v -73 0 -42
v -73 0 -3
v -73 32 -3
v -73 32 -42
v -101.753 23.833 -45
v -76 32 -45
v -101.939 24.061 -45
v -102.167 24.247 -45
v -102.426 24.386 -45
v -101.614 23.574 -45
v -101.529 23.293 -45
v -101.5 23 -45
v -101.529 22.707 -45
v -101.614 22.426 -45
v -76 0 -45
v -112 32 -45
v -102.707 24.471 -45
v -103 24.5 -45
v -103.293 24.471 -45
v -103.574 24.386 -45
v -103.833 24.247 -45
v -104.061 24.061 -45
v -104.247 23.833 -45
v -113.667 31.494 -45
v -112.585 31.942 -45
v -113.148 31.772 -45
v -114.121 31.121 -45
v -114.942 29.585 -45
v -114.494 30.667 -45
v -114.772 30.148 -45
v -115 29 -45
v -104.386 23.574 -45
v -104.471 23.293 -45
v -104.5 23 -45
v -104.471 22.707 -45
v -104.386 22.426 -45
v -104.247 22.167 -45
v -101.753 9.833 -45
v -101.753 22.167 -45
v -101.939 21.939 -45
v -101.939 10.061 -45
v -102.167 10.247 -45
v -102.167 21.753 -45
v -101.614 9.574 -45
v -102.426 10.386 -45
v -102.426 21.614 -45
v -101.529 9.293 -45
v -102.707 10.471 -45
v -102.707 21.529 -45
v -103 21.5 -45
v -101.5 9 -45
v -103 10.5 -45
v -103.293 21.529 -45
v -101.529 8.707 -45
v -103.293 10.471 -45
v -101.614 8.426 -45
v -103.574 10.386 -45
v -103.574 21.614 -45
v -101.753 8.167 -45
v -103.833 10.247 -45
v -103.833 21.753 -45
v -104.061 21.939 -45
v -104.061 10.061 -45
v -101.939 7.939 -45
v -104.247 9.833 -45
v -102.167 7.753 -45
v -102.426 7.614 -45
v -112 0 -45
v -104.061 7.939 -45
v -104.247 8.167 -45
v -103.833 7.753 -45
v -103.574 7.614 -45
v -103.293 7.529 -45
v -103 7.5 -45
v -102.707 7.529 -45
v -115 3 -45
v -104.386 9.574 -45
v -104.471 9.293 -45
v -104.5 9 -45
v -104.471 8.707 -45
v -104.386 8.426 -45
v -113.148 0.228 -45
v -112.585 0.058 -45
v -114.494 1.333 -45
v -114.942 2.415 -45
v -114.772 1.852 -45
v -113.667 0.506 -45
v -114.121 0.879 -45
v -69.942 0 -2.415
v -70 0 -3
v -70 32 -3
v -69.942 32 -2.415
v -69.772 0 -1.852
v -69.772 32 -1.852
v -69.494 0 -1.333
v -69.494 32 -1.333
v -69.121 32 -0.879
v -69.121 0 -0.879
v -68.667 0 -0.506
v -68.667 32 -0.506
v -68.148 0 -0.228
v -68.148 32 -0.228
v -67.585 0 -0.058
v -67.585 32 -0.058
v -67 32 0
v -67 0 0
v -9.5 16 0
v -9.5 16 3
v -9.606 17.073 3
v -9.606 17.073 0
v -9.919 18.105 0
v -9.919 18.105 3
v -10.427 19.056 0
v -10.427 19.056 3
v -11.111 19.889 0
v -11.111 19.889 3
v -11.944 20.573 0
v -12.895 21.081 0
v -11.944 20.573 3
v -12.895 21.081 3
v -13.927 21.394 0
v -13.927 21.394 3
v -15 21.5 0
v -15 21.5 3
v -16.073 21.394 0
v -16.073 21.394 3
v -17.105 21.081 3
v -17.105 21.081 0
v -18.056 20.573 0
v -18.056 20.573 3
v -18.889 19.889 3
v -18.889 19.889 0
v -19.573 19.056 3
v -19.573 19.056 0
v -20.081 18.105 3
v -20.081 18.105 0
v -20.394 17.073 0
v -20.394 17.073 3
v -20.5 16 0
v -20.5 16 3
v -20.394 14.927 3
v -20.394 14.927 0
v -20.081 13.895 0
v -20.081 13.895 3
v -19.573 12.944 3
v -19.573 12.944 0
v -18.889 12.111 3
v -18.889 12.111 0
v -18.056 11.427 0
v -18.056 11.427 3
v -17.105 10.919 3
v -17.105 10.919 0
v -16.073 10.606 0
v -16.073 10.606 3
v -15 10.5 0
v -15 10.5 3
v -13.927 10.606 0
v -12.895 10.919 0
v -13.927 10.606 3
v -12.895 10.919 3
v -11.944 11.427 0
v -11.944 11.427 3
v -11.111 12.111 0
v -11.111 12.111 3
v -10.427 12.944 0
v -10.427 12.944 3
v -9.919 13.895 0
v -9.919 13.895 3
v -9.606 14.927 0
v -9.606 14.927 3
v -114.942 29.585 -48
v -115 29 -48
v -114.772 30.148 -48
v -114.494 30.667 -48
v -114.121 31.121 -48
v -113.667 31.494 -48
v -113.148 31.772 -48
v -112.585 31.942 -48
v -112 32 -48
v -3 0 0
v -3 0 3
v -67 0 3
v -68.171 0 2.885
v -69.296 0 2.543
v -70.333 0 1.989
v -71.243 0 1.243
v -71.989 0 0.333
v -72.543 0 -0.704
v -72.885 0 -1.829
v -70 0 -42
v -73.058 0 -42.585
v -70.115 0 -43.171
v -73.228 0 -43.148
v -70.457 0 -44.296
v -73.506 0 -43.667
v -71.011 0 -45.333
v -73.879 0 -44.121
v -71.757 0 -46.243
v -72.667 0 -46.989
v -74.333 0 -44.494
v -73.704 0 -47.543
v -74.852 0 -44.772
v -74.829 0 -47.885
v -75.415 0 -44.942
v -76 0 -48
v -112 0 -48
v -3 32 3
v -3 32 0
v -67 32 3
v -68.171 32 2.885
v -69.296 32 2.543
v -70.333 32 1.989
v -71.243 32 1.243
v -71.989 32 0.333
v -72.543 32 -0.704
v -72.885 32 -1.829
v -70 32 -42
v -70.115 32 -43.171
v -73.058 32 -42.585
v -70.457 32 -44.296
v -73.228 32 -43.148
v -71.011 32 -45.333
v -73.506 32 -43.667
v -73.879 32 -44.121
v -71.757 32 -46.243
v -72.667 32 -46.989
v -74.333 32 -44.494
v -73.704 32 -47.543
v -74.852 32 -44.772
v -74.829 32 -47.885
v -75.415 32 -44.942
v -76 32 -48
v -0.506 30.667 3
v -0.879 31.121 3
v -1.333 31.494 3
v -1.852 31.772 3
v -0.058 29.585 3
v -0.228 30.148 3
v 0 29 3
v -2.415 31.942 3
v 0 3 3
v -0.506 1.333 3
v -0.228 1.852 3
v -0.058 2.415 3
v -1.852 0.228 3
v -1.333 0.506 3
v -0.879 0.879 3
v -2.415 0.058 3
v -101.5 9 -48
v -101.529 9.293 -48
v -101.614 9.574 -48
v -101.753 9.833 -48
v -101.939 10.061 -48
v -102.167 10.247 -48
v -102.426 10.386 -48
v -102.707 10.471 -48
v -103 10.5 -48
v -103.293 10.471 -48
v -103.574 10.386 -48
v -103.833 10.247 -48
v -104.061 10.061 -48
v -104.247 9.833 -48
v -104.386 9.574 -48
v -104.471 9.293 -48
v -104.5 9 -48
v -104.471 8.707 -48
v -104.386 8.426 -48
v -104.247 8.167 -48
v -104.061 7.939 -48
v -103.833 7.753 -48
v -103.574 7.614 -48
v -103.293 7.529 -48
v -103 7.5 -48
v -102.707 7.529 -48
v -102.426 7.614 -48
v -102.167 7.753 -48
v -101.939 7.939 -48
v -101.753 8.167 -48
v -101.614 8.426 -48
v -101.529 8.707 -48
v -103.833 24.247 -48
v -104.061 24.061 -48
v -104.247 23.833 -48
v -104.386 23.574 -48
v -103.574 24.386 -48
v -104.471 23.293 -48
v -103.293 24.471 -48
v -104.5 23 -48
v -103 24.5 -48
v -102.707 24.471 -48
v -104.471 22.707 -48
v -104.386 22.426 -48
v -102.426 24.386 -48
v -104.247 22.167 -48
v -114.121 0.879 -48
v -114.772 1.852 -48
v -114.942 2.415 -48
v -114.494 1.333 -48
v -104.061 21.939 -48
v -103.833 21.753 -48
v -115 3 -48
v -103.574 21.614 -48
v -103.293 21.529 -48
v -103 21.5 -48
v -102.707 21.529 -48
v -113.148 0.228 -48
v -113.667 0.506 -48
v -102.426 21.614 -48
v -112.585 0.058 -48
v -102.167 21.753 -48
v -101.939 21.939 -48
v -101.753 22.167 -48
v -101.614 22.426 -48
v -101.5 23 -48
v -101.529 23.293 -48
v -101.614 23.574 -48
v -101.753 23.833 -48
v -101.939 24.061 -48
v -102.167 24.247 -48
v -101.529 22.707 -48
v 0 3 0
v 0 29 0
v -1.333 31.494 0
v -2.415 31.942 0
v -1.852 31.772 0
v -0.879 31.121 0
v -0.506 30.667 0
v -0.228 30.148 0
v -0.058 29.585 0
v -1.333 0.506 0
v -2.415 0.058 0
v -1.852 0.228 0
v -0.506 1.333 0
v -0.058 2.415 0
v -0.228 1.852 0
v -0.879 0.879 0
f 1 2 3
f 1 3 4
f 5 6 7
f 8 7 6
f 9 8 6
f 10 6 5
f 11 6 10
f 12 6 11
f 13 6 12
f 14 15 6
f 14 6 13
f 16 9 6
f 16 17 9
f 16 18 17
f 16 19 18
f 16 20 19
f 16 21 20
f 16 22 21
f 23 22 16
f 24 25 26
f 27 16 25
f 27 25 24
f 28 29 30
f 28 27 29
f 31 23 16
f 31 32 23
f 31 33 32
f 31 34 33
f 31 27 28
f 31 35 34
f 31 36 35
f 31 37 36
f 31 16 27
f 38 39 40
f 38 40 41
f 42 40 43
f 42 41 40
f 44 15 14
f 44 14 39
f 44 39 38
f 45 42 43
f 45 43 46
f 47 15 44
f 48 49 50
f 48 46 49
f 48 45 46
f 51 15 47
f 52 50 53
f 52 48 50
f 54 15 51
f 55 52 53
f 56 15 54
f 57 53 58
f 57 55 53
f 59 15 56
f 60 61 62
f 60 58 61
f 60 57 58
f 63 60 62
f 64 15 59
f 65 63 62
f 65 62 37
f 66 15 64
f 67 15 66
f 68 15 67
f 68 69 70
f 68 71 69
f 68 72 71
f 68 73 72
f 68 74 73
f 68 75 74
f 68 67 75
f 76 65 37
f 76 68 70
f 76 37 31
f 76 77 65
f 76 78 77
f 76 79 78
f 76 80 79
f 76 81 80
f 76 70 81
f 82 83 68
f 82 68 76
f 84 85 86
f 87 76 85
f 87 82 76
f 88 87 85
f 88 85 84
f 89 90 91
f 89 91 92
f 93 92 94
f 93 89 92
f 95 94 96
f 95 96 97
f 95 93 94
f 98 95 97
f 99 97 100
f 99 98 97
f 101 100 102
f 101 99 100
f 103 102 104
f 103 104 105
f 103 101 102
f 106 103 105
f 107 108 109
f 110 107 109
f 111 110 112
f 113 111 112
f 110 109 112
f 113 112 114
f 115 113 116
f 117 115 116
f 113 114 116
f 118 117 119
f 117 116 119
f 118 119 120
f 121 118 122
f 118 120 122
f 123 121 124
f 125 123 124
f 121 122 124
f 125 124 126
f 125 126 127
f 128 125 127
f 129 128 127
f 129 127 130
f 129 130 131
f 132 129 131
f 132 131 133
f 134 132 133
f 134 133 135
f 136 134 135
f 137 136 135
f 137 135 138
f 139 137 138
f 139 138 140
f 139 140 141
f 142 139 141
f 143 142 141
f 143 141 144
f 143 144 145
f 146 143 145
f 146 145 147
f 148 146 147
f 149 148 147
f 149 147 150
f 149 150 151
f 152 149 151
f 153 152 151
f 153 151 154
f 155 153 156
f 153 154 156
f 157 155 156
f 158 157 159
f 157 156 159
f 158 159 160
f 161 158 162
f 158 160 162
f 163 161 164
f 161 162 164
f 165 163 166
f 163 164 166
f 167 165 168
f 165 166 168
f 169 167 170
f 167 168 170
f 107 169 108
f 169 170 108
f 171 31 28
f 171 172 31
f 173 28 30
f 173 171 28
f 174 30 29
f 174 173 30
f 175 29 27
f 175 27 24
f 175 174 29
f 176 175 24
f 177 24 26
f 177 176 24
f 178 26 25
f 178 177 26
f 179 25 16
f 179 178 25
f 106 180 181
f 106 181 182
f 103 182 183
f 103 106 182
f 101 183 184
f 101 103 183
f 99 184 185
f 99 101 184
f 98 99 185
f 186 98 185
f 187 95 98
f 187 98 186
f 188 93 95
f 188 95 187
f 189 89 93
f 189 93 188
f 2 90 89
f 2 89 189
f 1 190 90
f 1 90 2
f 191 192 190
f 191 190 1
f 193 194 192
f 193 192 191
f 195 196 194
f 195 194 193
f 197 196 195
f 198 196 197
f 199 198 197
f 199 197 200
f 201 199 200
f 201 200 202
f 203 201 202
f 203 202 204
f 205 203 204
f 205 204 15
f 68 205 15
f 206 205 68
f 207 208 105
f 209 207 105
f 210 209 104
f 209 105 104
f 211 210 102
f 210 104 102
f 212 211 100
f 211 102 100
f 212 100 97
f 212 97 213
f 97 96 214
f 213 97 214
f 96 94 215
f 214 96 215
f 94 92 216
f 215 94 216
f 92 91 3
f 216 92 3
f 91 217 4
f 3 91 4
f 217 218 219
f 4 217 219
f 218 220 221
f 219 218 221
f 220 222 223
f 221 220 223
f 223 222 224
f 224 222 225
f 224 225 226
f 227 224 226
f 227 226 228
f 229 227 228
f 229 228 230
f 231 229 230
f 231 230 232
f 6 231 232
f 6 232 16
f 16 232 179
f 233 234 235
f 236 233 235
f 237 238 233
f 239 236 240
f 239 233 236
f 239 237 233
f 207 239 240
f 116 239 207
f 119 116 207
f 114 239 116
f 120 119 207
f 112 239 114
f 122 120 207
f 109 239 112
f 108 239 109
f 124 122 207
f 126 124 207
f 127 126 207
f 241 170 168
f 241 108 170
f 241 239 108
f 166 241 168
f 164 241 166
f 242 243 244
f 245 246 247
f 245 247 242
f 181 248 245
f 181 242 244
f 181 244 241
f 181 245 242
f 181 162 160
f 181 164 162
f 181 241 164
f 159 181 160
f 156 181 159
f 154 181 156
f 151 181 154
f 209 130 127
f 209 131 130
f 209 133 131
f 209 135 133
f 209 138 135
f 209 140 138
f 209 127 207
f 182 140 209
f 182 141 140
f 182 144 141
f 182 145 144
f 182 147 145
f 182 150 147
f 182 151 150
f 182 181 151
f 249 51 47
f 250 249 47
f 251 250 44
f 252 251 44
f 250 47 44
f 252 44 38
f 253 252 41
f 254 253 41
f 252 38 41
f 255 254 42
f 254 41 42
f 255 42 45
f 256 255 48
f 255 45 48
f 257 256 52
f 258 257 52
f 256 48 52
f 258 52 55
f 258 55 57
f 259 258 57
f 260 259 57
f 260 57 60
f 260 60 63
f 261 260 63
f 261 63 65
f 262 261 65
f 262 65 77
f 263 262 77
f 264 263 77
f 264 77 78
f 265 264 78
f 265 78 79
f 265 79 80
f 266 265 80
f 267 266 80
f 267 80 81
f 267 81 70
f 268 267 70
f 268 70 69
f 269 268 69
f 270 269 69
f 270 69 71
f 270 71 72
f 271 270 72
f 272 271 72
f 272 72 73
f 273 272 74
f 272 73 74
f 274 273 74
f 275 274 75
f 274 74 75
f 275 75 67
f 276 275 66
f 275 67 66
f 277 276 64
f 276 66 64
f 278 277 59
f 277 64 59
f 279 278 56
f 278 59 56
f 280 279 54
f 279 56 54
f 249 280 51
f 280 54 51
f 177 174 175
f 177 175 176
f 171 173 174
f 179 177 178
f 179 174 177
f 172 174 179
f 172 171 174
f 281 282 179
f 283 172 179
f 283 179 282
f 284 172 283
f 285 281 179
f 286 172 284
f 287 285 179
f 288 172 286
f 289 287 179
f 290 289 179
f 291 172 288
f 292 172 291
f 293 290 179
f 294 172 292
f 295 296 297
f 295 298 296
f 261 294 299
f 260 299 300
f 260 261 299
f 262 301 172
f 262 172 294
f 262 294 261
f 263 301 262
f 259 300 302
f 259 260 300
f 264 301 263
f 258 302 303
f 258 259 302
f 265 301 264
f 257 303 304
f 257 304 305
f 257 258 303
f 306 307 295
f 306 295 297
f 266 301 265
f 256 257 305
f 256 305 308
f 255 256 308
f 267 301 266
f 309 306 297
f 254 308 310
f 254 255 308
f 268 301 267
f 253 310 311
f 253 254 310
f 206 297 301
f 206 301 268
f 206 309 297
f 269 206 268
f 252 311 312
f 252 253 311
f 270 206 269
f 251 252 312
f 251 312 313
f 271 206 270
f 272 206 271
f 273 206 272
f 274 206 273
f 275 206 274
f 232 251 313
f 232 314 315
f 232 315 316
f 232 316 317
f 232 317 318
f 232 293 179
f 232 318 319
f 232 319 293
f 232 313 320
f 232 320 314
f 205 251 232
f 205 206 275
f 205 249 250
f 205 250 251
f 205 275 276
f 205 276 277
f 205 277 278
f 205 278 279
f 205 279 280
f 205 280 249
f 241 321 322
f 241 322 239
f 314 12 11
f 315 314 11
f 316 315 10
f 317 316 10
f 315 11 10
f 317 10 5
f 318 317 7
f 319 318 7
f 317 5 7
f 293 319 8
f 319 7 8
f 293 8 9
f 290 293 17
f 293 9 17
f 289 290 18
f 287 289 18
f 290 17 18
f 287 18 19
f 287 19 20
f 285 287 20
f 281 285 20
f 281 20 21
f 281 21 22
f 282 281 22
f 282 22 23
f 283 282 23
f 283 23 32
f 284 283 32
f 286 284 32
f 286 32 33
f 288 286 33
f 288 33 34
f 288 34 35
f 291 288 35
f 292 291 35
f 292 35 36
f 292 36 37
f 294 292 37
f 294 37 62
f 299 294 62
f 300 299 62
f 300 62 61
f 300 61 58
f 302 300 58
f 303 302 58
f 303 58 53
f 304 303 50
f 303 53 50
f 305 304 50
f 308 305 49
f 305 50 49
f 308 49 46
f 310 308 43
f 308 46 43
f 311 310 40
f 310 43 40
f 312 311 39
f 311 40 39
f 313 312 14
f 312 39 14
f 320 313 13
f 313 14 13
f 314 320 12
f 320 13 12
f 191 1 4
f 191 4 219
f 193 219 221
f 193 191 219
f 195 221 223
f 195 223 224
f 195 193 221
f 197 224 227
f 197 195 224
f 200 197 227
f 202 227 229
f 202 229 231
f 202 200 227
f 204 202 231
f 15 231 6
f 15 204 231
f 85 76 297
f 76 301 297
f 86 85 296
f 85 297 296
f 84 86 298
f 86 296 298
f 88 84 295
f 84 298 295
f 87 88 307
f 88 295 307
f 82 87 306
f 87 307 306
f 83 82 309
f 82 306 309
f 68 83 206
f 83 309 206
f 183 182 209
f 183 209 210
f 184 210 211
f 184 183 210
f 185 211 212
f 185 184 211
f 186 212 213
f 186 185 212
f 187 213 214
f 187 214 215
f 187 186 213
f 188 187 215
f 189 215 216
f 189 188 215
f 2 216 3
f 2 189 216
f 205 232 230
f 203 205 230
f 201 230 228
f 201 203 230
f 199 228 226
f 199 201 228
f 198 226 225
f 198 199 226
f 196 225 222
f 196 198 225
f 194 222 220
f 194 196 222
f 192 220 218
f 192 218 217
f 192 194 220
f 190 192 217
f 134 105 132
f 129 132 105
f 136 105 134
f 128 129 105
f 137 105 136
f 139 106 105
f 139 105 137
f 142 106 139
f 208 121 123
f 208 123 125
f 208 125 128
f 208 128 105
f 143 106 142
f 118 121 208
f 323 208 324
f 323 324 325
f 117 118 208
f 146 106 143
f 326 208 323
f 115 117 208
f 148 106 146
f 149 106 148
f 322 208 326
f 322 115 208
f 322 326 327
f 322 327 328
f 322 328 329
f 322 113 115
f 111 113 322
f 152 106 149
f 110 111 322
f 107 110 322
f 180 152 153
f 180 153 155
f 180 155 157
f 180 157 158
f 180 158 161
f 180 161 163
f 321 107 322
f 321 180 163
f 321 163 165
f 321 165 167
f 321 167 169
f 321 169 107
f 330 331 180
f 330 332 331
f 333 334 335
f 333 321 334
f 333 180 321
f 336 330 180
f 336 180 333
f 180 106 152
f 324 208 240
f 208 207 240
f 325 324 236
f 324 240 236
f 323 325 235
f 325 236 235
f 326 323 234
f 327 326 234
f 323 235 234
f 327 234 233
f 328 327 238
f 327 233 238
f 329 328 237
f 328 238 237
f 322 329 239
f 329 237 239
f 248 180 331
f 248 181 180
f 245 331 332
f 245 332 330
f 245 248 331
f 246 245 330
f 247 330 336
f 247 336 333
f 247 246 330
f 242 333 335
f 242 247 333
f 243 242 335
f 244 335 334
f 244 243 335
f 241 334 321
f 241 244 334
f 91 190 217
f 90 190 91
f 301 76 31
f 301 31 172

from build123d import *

# Parameters (mm, degrees)
BASE_FLANGE1_DEPTH = 32
CUT_EXTRUDE1_REACH = 130.658
SKETCH7_R          = 1.5
CUT_EXTRUDE2_REACH = 131.808
SKETCH8_R          = 5.5
FILLET1_R          = 3


# Sheet-metal steps are written as plain solids
with BuildPart() as part:
    # Sketch2 → Base-Flange1 (new body)
    with BuildSketch(Plane(origin=(0, 0, 0), x_dir=(1, 0, 0), z_dir=(0, 1, 0))):
        with BuildLine():
            Line((-115, 48), (-76, 48))
            ThreePointArc((-76, 48), (-71.757359313, 46.242640687), (-70, 42))
            Line((-70, 42), (-70, 3))
            ThreePointArc((-70, 3), (-69.121320344, 0.878679656), (-67, 0))
            Line((-67, 0), (0, 0))
            Line((0, 0), (0, -3))
            Line((0, -3), (-67, -3))
            ThreePointArc((-67, -3), (-71.242640687, -1.242640687), (-73, 3))
            Line((-73, 3), (-73, 42))
            ThreePointArc((-73, 42), (-73.878679656, 44.121320344), (-76, 45))
            Line((-76, 45), (-115, 45))
            Line((-115, 45), (-115, 48))
        make_face()
    extrude(amount=BASE_FLANGE1_DEPTH)

    # Sketch7 → Cut-Extrude1 (cut, up to next)
    with BuildSketch(Plane.XY.offset(-45), mode=Mode.PRIVATE) as cut_extrude1_sk1:
        with Locations((-103, 23)):
            Circle(SKETCH7_R)
    cut_extrude1_tool1 = extrude(cut_extrude1_sk1.sketch, amount=-CUT_EXTRUDE1_REACH, mode=Mode.PRIVATE) & part.part
    # Sketch7 → Cut-Extrude1 (cut, up to next)
    with BuildSketch(Plane.XY.offset(-45), mode=Mode.PRIVATE) as cut_extrude1_sk2:
        with Locations((-103, 9)):
            Circle(SKETCH7_R)
    cut_extrude1_tool2 = extrude(cut_extrude1_sk2.sketch, amount=-CUT_EXTRUDE1_REACH, mode=Mode.PRIVATE) & part.part
    add(cut_extrude1_tool1.solids().sort_by_distance((-103, 23, -45))[0], mode=Mode.SUBTRACT)
    add(cut_extrude1_tool2.solids().sort_by_distance((-103, 9, -45))[0], mode=Mode.SUBTRACT)

    # Sketch8 → Cut-Extrude2 (cut, up to next)
    with BuildSketch(Plane.XY.offset(3), mode=Mode.PRIVATE) as cut_extrude2_sk1:
        with Locations((-15, 16)):
            Circle(SKETCH8_R)
    cut_extrude2_tool1 = extrude(cut_extrude2_sk1.sketch, amount=-CUT_EXTRUDE2_REACH, mode=Mode.PRIVATE) & part.part
    add(cut_extrude2_tool1.solids().sort_by_distance((-15, 16, 3))[0], mode=Mode.SUBTRACT)

    # Fillet1
    fillet1_edges = [part.edges().sort_by_distance(p)[0] for p in [
        (-115, 0, -46.5),
        (0, 0, 1.5),
        (-115, 32, -46.5),
        (0, 32, 1.5),
    ]]
    fillet(fillet1_edges, radius=FILLET1_R)


solid = part.part
